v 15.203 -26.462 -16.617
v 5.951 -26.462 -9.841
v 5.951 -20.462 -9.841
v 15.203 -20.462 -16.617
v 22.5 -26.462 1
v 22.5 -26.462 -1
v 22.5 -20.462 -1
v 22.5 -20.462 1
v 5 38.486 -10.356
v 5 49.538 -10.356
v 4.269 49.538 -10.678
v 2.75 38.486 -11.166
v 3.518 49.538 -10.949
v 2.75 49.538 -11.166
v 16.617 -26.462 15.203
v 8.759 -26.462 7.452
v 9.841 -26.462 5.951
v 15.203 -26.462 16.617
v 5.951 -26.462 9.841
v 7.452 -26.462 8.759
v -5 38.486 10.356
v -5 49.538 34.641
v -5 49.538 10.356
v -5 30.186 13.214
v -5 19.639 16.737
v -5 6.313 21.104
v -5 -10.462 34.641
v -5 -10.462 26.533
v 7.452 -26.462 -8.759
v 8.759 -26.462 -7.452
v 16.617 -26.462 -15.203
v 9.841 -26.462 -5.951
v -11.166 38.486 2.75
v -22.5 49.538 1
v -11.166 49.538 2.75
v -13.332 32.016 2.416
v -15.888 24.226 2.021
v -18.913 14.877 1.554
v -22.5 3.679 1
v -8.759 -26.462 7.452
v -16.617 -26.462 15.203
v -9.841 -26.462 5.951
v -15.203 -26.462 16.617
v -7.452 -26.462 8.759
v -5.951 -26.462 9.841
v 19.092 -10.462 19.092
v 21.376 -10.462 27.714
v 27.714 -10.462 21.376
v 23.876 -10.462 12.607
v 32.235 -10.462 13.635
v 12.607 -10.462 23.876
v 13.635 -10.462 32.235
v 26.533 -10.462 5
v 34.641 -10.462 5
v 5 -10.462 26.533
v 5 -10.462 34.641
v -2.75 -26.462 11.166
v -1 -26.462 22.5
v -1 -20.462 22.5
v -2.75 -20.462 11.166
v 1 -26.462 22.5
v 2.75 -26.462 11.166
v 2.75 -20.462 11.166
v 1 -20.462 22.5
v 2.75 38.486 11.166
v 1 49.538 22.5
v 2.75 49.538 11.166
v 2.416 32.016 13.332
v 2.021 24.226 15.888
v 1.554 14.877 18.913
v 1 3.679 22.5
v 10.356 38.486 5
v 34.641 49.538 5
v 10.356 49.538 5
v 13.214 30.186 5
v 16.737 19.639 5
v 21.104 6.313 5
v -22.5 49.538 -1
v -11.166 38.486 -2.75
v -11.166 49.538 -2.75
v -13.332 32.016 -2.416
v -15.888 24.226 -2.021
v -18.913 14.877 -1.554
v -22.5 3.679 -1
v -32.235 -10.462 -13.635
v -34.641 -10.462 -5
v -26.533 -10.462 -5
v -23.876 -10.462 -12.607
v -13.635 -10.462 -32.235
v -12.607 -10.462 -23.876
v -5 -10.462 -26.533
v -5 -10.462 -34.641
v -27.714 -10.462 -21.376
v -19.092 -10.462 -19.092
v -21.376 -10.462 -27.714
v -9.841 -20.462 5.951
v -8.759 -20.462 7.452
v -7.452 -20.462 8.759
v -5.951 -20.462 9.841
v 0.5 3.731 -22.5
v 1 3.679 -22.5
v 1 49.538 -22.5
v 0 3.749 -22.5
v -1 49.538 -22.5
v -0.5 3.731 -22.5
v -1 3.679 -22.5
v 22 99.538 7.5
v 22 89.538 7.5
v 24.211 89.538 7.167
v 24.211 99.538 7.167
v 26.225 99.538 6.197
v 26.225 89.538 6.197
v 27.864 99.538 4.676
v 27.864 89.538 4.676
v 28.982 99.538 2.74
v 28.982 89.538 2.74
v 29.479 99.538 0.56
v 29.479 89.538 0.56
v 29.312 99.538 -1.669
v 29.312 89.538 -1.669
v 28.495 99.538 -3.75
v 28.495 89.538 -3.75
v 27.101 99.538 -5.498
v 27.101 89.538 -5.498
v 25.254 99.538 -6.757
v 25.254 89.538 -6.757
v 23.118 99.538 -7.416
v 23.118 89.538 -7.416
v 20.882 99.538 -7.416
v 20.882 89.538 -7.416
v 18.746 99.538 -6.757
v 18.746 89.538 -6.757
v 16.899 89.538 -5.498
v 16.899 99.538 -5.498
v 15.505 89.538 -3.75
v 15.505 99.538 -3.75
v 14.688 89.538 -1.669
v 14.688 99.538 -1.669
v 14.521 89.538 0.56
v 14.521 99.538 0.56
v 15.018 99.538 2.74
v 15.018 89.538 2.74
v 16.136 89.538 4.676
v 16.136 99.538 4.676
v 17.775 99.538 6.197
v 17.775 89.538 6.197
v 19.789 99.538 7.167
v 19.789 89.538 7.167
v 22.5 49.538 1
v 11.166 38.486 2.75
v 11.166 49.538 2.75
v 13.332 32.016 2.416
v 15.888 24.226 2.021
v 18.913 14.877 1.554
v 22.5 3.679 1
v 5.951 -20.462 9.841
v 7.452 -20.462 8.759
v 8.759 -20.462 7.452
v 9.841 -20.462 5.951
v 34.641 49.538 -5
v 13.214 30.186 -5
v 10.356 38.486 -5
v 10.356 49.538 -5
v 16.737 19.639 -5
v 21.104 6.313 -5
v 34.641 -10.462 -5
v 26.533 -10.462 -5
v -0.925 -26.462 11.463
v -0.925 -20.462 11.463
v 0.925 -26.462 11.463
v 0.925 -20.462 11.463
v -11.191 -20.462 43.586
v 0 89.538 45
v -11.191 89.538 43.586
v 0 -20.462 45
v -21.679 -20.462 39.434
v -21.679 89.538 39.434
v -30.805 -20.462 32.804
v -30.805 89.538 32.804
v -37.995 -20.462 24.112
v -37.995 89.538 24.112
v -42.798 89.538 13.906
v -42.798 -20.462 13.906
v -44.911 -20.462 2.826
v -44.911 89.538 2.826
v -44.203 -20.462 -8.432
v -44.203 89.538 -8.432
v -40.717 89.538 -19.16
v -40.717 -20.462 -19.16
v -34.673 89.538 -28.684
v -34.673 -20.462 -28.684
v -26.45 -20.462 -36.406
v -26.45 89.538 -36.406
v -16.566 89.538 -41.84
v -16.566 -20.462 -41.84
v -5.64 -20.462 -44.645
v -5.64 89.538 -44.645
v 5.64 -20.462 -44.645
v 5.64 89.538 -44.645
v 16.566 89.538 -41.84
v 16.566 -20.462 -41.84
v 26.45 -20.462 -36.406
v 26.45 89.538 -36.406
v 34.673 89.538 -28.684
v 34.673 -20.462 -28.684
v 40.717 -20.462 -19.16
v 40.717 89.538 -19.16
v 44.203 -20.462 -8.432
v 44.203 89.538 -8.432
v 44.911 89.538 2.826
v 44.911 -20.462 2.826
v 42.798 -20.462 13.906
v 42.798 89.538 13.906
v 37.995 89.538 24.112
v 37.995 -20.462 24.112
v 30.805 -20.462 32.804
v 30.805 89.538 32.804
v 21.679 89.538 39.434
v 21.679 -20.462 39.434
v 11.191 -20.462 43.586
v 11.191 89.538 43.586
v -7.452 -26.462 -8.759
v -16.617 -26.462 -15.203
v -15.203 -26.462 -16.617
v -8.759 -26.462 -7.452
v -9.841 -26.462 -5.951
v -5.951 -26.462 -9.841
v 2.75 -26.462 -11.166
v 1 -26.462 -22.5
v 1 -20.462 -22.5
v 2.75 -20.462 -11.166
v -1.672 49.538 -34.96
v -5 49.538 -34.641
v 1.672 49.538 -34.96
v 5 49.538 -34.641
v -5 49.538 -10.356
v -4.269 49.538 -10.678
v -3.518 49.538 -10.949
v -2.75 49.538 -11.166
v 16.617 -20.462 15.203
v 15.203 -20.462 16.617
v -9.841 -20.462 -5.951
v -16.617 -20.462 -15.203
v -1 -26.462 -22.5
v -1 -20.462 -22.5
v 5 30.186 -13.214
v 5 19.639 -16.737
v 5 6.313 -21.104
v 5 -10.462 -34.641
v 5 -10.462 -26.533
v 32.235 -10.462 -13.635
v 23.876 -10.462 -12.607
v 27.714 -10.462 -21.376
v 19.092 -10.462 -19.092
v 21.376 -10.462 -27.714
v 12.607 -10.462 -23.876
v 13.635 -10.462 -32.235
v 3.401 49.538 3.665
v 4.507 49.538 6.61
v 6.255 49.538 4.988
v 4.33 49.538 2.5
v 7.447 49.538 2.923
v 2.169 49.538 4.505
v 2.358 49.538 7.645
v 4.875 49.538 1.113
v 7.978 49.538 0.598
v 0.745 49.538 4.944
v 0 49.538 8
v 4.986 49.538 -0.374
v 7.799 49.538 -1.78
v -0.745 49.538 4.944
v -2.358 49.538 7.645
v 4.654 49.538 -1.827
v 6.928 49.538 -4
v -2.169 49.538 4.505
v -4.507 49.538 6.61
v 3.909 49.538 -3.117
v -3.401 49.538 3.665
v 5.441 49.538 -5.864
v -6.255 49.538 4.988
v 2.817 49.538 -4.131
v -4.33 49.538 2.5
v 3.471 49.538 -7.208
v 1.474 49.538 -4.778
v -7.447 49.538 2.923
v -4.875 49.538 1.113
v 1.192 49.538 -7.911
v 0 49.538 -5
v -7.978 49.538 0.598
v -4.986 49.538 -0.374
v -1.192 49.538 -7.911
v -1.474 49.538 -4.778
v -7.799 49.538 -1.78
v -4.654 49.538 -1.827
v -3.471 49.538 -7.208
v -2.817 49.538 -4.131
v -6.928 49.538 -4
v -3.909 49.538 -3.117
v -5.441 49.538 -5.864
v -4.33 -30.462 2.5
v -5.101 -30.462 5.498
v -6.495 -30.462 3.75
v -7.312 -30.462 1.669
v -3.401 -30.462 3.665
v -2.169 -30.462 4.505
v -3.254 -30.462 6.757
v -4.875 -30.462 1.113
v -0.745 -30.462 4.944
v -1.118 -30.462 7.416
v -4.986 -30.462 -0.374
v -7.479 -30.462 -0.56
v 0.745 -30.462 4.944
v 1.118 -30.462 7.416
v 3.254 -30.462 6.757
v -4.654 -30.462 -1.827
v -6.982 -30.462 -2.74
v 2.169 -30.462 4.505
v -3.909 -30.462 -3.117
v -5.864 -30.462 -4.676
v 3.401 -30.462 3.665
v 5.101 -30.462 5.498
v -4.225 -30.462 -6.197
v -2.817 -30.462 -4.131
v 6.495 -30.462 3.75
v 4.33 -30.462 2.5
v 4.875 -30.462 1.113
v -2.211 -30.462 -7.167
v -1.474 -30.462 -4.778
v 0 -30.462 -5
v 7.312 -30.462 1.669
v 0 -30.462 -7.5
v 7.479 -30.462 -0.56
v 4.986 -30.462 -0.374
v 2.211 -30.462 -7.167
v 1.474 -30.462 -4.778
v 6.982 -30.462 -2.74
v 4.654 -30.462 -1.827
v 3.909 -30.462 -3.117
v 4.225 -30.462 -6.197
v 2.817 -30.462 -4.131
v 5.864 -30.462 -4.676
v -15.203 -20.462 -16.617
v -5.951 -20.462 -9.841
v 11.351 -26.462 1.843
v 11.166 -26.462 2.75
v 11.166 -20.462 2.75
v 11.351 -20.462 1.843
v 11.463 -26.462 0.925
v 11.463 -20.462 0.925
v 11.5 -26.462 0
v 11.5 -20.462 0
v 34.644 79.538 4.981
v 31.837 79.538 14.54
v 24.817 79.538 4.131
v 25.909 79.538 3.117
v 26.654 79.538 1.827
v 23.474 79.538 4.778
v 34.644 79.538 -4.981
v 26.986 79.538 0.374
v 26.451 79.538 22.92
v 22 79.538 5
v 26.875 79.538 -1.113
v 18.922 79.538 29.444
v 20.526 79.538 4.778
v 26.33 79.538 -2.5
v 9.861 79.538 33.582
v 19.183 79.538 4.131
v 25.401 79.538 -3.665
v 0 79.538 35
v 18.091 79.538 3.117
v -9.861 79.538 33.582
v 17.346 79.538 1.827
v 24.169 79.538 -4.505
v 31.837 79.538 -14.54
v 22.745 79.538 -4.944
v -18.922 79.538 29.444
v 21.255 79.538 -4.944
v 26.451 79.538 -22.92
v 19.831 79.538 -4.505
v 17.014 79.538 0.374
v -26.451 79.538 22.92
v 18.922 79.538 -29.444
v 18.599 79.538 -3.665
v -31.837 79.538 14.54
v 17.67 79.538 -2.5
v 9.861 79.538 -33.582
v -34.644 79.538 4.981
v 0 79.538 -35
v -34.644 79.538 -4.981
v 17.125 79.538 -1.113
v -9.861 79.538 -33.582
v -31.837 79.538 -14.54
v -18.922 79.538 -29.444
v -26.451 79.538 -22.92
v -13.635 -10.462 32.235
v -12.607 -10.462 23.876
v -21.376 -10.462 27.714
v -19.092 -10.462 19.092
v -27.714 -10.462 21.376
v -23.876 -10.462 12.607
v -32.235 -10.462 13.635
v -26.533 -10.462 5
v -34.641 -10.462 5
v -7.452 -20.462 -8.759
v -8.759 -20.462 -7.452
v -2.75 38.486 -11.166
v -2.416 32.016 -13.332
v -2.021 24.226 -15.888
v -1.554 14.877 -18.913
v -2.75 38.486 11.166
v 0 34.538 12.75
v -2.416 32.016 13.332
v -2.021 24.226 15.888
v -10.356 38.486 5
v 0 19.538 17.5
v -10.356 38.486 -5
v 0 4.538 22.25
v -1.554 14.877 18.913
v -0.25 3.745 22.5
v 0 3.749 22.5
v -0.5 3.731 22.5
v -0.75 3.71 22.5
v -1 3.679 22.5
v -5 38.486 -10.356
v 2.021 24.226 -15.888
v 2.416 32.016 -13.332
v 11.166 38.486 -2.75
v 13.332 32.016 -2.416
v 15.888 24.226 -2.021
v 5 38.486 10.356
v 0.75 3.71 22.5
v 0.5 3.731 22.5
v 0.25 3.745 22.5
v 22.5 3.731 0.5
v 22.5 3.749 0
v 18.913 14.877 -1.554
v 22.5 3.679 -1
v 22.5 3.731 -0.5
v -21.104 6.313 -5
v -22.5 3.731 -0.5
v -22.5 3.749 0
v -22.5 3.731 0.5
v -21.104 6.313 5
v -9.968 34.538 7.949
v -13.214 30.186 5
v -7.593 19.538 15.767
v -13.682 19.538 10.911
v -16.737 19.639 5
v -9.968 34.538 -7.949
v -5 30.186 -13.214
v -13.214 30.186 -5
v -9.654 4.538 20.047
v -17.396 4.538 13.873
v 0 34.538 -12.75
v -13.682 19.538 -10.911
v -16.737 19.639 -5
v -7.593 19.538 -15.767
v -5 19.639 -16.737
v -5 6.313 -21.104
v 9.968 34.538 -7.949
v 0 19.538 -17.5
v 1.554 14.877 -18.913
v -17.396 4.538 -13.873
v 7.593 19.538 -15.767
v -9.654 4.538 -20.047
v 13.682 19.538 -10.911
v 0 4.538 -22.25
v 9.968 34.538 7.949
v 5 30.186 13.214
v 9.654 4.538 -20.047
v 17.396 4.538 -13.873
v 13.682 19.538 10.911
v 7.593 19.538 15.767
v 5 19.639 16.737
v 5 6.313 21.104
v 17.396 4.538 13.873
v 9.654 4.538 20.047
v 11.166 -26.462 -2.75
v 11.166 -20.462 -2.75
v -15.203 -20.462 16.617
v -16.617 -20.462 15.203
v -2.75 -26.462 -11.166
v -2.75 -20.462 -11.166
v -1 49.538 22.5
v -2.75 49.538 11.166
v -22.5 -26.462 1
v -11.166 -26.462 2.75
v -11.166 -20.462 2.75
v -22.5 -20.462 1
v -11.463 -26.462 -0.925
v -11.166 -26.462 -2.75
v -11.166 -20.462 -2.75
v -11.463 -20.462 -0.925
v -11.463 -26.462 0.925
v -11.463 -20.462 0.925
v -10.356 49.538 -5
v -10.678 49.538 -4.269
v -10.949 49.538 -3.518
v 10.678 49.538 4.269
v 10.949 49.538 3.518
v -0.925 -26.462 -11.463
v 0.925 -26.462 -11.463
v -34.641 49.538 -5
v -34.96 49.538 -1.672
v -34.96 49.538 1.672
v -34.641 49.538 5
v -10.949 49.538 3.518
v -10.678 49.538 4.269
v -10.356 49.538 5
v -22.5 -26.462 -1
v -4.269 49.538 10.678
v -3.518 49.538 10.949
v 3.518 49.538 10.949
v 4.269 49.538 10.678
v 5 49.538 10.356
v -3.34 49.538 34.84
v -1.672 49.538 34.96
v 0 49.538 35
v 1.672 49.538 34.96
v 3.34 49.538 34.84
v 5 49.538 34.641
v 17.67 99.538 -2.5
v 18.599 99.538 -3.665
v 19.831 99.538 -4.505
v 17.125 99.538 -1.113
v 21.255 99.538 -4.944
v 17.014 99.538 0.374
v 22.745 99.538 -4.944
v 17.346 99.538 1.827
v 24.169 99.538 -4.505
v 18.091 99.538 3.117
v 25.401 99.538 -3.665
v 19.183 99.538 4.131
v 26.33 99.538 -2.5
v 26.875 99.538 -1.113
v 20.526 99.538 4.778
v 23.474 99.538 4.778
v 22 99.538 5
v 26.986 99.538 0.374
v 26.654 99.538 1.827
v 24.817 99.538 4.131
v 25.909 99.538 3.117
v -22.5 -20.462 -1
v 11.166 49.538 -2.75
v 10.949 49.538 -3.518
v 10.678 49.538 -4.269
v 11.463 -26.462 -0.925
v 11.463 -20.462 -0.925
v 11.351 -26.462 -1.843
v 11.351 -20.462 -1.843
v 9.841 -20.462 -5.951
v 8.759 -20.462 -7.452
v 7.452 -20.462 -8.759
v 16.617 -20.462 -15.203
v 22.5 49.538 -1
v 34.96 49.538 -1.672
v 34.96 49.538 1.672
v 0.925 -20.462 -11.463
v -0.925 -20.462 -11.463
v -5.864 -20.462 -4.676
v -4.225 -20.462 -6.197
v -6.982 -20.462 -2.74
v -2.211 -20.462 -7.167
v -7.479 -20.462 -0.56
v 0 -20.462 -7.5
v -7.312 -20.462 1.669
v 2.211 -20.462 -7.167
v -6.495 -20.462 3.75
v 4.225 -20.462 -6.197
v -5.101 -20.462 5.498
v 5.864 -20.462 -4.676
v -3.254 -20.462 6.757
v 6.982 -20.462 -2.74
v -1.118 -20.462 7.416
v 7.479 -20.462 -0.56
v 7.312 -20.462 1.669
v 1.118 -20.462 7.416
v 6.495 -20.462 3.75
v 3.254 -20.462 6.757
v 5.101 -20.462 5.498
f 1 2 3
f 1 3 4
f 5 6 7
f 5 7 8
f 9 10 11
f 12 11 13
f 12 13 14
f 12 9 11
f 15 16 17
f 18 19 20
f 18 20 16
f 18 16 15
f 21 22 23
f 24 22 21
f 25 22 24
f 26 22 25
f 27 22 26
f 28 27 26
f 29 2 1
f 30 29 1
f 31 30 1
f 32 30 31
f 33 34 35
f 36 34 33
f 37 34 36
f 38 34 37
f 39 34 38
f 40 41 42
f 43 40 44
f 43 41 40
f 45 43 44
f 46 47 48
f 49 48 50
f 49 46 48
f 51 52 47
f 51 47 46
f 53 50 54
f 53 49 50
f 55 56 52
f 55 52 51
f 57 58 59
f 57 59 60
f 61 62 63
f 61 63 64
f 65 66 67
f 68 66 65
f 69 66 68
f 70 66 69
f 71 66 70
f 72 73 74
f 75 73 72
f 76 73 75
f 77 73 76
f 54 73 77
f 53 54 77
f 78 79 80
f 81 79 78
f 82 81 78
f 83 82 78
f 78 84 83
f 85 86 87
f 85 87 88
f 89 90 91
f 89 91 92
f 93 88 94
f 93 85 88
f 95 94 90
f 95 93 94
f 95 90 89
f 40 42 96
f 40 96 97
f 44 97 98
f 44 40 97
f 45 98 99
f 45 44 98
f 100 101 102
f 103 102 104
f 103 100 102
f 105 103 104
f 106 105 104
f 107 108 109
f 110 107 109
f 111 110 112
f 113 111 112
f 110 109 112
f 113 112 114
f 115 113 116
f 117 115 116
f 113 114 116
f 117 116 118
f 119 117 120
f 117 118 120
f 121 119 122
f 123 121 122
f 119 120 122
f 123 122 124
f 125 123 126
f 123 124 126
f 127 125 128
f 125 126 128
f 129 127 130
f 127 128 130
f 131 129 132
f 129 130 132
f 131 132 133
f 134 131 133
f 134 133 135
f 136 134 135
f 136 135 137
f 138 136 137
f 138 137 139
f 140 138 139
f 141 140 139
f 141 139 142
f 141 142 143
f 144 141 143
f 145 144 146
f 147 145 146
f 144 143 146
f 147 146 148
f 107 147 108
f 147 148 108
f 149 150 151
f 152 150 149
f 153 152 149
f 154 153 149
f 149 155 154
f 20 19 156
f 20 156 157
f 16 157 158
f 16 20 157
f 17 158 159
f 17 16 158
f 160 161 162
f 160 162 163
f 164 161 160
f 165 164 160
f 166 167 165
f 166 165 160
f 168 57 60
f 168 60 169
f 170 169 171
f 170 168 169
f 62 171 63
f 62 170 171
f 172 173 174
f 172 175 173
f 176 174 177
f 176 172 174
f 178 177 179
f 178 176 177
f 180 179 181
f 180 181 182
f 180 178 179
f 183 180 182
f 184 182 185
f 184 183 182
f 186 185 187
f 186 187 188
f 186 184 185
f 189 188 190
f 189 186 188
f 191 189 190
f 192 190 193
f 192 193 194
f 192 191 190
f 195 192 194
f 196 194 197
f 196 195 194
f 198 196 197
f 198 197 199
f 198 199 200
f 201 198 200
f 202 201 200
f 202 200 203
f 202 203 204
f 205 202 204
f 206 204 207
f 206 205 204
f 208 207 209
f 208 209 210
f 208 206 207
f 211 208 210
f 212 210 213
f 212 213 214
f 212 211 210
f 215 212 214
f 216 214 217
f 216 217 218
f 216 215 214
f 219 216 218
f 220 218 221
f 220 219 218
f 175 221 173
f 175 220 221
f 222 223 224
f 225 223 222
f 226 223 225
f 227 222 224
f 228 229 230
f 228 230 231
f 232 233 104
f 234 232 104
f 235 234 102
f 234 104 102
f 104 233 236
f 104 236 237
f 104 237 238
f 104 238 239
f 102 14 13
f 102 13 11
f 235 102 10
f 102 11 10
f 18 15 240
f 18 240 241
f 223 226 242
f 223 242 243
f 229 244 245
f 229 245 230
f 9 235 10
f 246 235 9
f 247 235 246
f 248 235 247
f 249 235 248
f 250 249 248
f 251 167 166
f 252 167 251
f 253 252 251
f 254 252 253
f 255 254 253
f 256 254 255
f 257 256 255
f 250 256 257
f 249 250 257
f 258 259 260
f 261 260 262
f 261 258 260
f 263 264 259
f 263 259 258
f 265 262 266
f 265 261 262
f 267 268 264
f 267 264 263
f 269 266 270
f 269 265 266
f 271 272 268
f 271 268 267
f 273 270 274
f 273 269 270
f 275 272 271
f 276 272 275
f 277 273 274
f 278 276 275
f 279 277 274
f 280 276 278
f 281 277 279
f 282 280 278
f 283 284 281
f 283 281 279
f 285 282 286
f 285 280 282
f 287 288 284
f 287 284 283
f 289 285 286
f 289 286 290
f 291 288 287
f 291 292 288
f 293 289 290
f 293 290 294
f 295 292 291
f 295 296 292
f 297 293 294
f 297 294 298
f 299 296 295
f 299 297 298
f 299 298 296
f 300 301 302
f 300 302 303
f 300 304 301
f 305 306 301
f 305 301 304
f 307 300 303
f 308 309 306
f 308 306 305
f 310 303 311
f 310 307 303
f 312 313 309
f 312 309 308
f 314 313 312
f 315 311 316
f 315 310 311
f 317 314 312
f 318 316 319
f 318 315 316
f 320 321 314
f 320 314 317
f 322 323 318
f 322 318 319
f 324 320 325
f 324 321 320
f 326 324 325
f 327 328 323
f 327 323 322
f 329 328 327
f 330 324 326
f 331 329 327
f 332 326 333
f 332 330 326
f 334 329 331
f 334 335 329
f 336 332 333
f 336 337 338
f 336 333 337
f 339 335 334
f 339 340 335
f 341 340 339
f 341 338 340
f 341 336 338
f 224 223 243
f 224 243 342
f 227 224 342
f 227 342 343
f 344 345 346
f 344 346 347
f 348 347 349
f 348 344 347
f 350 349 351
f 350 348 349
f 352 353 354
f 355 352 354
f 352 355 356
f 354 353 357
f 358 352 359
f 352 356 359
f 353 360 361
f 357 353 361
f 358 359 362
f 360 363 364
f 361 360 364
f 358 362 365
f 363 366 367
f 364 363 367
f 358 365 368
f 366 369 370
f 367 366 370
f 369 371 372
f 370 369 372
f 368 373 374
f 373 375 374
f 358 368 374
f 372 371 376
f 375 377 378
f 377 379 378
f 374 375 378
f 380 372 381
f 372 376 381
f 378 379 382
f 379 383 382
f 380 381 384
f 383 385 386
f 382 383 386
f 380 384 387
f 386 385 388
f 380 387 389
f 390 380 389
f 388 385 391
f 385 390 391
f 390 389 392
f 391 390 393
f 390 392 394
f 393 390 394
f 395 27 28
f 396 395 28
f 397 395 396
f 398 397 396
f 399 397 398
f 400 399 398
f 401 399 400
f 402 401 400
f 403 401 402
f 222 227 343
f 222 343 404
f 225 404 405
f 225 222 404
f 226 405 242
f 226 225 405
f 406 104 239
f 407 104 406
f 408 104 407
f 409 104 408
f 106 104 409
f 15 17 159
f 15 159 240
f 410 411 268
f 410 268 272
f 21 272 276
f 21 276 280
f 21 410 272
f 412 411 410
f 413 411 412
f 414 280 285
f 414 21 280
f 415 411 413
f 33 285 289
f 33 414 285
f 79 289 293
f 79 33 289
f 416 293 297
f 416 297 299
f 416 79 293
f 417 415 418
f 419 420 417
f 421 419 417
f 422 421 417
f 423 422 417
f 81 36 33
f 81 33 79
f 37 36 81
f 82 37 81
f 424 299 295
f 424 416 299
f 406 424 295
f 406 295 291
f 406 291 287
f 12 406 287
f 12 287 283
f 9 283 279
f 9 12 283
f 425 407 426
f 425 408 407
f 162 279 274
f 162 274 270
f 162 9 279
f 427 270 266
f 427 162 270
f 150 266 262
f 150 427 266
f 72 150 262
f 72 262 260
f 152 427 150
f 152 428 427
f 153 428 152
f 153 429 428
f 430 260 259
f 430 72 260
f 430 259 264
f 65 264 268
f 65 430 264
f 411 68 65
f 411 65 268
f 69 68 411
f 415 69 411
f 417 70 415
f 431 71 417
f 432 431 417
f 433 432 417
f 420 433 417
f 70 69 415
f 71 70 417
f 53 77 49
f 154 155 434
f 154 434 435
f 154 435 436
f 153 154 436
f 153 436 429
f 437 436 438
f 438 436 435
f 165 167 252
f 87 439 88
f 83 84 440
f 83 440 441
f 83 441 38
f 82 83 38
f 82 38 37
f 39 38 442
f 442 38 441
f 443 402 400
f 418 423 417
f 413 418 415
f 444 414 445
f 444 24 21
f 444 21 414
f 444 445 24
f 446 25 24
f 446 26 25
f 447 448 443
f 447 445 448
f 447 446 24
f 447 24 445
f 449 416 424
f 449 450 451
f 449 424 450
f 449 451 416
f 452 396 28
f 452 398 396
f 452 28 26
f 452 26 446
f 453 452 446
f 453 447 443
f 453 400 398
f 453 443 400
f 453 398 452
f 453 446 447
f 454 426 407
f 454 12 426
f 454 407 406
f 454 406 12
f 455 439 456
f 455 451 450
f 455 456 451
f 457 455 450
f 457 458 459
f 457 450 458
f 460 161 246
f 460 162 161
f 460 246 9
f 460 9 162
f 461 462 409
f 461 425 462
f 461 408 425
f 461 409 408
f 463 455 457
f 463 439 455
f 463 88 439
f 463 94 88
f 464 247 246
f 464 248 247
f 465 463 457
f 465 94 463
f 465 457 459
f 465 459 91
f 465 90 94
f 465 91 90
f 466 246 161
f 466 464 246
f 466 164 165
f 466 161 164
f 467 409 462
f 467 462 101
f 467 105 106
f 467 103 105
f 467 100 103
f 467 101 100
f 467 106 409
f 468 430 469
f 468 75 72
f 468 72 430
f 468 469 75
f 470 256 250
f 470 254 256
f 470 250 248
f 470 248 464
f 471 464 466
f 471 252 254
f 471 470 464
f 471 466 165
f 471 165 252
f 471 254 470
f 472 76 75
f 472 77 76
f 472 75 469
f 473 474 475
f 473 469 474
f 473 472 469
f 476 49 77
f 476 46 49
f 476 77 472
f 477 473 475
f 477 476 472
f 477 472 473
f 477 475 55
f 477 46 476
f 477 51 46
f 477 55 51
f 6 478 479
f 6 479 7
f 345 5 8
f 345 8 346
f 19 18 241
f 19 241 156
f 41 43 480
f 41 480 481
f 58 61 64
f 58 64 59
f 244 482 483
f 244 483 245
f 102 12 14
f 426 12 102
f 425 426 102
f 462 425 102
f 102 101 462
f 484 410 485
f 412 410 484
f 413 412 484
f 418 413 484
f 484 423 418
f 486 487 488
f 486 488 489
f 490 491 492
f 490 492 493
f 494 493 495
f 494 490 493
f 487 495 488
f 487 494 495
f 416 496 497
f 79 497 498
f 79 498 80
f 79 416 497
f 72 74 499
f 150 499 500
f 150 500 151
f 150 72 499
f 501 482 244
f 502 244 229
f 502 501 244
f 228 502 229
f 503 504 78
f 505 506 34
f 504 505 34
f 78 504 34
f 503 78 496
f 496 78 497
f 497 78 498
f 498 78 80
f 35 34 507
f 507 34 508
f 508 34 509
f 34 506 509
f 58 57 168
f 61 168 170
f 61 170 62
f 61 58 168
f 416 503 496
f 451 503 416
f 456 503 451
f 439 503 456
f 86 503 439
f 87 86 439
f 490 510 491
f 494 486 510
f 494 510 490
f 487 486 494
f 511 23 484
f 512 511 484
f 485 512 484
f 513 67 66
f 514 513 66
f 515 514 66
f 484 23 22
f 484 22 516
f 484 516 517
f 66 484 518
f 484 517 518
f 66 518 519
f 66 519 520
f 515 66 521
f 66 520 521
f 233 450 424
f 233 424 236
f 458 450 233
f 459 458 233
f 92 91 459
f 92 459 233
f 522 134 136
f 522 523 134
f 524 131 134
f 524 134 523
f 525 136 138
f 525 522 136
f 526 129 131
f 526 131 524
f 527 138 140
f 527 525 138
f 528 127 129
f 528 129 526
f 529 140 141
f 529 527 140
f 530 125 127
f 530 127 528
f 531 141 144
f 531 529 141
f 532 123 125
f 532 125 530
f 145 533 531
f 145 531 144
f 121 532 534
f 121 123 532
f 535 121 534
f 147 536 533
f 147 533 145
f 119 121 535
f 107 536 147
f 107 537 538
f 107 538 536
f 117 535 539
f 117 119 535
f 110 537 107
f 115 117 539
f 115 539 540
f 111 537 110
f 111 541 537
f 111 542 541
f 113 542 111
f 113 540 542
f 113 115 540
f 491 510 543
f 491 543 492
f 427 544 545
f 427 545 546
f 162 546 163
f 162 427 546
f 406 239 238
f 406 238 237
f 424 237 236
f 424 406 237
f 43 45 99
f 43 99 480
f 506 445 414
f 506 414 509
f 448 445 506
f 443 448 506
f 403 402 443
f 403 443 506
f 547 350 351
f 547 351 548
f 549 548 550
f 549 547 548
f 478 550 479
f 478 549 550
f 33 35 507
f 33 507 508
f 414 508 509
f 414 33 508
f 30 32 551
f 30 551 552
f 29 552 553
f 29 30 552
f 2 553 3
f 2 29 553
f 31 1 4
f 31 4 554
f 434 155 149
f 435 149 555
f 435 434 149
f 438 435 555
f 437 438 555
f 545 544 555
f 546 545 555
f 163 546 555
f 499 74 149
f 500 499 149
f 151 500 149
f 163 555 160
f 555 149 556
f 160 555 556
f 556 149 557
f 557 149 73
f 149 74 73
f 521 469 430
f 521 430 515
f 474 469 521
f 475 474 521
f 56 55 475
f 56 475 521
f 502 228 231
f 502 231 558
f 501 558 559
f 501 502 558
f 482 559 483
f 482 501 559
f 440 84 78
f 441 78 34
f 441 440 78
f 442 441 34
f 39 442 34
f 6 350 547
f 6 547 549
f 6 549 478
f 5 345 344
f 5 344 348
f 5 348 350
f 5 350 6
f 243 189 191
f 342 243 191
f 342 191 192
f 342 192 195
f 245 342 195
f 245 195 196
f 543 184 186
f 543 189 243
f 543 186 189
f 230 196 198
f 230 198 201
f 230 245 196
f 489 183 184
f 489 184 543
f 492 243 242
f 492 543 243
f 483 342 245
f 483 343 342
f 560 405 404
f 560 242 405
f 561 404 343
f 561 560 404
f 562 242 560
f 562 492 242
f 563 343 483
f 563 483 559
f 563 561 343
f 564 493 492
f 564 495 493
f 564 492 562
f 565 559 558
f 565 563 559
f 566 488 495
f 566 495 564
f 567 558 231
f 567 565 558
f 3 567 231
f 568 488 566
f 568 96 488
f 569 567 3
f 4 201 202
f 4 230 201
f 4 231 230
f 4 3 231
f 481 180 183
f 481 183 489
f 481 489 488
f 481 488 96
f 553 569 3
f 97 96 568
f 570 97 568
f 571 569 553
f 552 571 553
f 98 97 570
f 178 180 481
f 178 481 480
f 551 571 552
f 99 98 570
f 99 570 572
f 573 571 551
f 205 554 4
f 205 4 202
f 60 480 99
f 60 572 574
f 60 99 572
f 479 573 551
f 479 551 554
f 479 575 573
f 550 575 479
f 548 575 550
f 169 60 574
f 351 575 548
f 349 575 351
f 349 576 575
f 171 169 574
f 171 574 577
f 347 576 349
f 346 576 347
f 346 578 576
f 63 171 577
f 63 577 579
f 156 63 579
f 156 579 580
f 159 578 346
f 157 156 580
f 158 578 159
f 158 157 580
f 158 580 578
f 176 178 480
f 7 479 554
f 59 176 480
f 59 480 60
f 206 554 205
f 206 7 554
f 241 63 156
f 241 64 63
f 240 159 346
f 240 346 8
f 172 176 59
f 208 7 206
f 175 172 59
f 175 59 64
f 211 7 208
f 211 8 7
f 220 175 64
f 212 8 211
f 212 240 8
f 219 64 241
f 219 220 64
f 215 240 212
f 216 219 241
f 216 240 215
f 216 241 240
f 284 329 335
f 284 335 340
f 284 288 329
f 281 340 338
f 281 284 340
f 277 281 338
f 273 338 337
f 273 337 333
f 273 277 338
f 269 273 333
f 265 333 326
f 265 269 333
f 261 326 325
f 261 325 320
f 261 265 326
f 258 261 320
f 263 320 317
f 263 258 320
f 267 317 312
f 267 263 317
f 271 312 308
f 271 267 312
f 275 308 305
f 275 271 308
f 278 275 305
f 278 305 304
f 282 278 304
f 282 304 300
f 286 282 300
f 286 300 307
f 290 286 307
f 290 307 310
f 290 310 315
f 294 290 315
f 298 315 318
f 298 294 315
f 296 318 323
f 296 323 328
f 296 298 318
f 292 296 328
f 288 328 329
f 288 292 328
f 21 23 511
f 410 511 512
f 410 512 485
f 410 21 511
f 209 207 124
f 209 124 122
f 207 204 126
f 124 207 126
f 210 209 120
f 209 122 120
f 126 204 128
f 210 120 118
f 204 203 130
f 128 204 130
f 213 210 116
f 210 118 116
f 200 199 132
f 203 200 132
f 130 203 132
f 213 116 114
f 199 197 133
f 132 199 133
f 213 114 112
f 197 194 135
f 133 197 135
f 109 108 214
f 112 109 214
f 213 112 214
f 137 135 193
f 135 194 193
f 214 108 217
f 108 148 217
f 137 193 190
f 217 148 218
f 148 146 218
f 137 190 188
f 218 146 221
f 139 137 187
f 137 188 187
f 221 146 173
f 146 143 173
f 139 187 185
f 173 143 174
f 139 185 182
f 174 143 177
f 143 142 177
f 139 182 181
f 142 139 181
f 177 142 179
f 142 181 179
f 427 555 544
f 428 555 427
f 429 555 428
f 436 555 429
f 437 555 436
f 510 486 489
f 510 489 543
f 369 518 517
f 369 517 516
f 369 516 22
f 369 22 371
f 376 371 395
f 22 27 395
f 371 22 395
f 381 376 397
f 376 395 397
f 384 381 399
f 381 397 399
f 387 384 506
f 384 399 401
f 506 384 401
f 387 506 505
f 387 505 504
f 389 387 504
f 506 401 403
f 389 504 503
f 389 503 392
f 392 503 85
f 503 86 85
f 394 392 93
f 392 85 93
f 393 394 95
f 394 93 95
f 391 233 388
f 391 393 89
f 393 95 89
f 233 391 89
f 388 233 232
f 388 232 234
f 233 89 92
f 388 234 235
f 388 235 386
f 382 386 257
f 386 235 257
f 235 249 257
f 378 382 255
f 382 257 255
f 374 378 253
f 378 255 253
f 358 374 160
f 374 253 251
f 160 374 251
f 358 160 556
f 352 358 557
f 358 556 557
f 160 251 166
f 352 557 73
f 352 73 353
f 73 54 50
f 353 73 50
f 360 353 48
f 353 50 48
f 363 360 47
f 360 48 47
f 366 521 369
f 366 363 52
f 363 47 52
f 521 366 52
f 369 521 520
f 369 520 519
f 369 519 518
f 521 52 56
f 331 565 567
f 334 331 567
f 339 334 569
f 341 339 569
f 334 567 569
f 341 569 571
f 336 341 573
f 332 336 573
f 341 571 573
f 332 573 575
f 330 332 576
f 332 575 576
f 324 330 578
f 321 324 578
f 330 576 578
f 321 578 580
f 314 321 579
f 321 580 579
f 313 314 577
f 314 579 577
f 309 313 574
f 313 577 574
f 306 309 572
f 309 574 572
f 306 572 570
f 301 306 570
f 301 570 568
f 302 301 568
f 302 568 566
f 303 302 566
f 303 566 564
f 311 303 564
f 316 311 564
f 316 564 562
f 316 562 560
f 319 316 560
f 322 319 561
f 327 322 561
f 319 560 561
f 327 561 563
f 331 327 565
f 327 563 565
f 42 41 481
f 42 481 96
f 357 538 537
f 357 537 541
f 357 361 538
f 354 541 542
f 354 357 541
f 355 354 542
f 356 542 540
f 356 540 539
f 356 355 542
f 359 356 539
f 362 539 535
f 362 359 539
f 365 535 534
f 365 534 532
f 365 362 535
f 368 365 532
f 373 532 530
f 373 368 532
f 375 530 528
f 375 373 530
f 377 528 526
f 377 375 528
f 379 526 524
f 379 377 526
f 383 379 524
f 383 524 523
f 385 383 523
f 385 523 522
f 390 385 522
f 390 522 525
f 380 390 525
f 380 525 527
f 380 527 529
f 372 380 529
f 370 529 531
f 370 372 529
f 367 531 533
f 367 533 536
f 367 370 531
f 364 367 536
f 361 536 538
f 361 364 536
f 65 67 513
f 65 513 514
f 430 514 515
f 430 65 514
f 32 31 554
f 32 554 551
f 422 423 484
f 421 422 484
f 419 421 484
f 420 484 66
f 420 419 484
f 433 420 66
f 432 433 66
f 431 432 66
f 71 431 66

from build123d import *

# Parameters (mm, degrees)
SKETCH1_W           = 35
SKETCH1_H           = 10
BOSS_EXTRUDE1_DEPTH = 70
SKETCH2_3_R         = 7.5
SKETCH2_3_R_2       = 5
BOSS_EXTRUDE2_DEPTH = 10
CUT_EXTRUDE1_START  = -70
SKETCH2_4_R         = 5
CUT_EXTRUDE1_DEPTH  = 70
SKETCH3_R           = 7.5
SKETCH3_R_2         = 5
BOSS_EXTRUDE3_DEPTH = 10
CUT_EXTRUDE3_START  = -10
SKETCH3_2_R         = 5
CUT_EXTRUDE3_DEPTH  = 10
BOSS_EXTRUDE6_START = 6
BOSS_EXTRUDE6_DEPTH = 6


with BuildPart() as part:
    # Sketch1 → Revolve1 (revolve)
    with BuildSketch(Plane(origin=(0, 0, 0), x_dir=(0, 0, -1), z_dir=(1, 0, 0)), mode=Mode.PRIVATE) as revolve1_sk:
        Polygon((35, 79.538461538), (35, 89.538461538), (45, 89.538461538), (45, -20.461538462), (0, -20.461538462), (0, -10.461538462), (0, 49.538461538), (8, 49.538461538), (27, -10.461538462), (35, -10.461538462), align=None)
        with Locations((17.5, 84.538461538)):
            Rectangle(SKETCH1_W, SKETCH1_H)
    revolve(revolve1_sk.sketch.rotate(Axis((0, 0, 0), (0, -1, 0)), 180), axis=Axis((0, 0, 0), (0, -1, 0)))

    # Sketch2 → Boss-Extrude1 (add)
    with BuildSketch(Plane.XZ.offset(20.461538462)):
        with BuildLine():
            Line((40, 5), (10.356157589, 5))
            ThreePointArc((10.356157589, 5), (10.819851722, 3.896255731), (11.166285361, 2.750285665))
            Line((11.166285361, 2.750285665), (22.5, 1))
            Line((22.5, 1), (22.5, -1))
            Line((22.5, -1), (11.166285361, -2.750285665))
            ThreePointArc((11.166285361, -2.750285665), (10.819851722, -3.896255731), (10.356157589, -5))
            Line((10.356157589, -5), (40, -5))
            Line((40, -5), (40, 5))
        make_face()
        with BuildLine():
            ThreePointArc((2.750285665, 11.166285361), (3.896255731, 10.819851722), (5, 10.356157589))
            Line((5, 10.356157589), (5, 40))
            Line((5, 40), (-5, 40))
            Line((-5, 40), (-5, 10.356157589))
            ThreePointArc((-5, 10.356157589), (-3.896255731, 10.819851722), (-2.750285665, 11.166285361))
            Line((-2.750285665, 11.166285361), (-1, 22.5))
            Line((-1, 22.5), (1, 22.5))
            Line((1, 22.5), (2.750285665, 11.166285361))
        make_face()
        with BuildLine():
            Line((5, -40), (5, -10.356157589))
            ThreePointArc((5, -10.356157589), (3.896255731, -10.819851722), (2.750285665, -11.166285361))
            Line((2.750285665, -11.166285361), (1, -22.5))
            Line((1, -22.5), (-1, -22.5))
            Line((-1, -22.5), (-2.750285665, -11.166285361))
            ThreePointArc((-2.750285665, -11.166285361), (-3.896255731, -10.819851722), (-5, -10.356157589))
            Line((-5, -10.356157589), (-5, -40))
            Line((-5, -40), (5, -40))
        make_face()
        with BuildLine():
            ThreePointArc((-11.166285361, 2.750285665), (-10.819851722, 3.896255731), (-10.356157589, 5))
            Line((-10.356157589, 5), (-40, 5))
            Line((-40, 5), (-40, -5))
            Line((-40, -5), (-10.356157589, -5))
            ThreePointArc((-10.356157589, -5), (-10.819851722, -3.896255731), (-11.166285361, -2.750285665))
            Line((-11.166285361, -2.750285665), (-22.5, -1))
            Line((-22.5, -1), (-22.5, 1))
            Line((-22.5, 1), (-11.166285361, 2.750285665))
        make_face()
    extrude(amount=-BOSS_EXTRUDE1_DEPTH)

    # Sketch2<3> → Boss-Extrude2 (add)
    with BuildSketch(Plane.XZ.offset(20.461538462)):
        with Locations(Location((0, 0, 0), (0, 0, 270))):
            Circle(SKETCH2_3_R)
        with Locations(Location((0, 0, 0), (0, 0, 270))):
            Circle(SKETCH2_3_R_2, mode=Mode.SUBTRACT)
    extrude(amount=BOSS_EXTRUDE2_DEPTH)

    # Sketch2<4> → Cut-Extrude1 (cut)
    with BuildSketch(Plane.XZ.offset(20.461538462).offset(CUT_EXTRUDE1_START)):
        with Locations(Location((0, 0, 0), (0, 0, 270))):
            Circle(SKETCH2_4_R)
    extrude(amount=CUT_EXTRUDE1_DEPTH, mode=Mode.SUBTRACT)

    # Sketch3 → Boss-Extrude3 (add)
    with BuildSketch(Plane(origin=(0, 89.538461538, 0), x_dir=(1, 0, 0), z_dir=(0, 1, 0))):
        with Locations(Location((22, 0, 0), (0, 0, 270))):
            Circle(SKETCH3_R)
        with Locations(Location((22, 0, 0), (0, 0, 270))):
            Circle(SKETCH3_R_2, mode=Mode.SUBTRACT)
    extrude(amount=BOSS_EXTRUDE3_DEPTH)

    # Sketch3<2> → Cut-Extrude3 (cut)
    with BuildSketch(Plane(origin=(0, 89.538461538, 0), x_dir=(1, 0, 0), z_dir=(0, 1, 0)).offset(CUT_EXTRUDE3_START)):
        with Locations(Location((22, 0, 0), (0, 0, 270))):
            Circle(SKETCH3_2_R)
    extrude(amount=CUT_EXTRUDE3_DEPTH, mode=Mode.SUBTRACT)

    # Sketch2<5> → Boss-Extrude6 (add)
    with BuildSketch(Plane.XZ.offset(20.461538462).offset(BOSS_EXTRUDE6_START)):
        with BuildLine():
            ThreePointArc((-9.840501743, 5.951010455), (-8.131727984, 8.131727984), (-5.951010455, 9.840501743))
            Line((-5.951010455, 9.840501743), (-15.202795796, 16.617009358))
            Line((-15.202795796, 16.617009358), (-15.909902577, 15.909902577))
            Line((-15.909902577, 15.909902577), (-16.617009358, 15.202795796))
            Line((-16.617009358, 15.202795796), (-9.840501743, 5.951010455))
        make_face()
        with BuildLine():
            ThreePointArc((-2.750285665, 11.166285361), (0, 11.5), (2.750285665, 11.166285361))
            Line((2.750285665, 11.166285361), (1, 22.5))
            Line((1, 22.5), (0, 22.5))
            Line((0, 22.5), (-1, 22.5))
            Line((-1, 22.5), (-2.750285665, 11.166285361))
        make_face()
        with BuildLine():
            ThreePointArc((5.951010455, 9.840501743), (8.131727984, 8.131727984), (9.840501743, 5.951010455))
            Line((9.840501743, 5.951010455), (16.617009358, 15.202795796))
            Line((16.617009358, 15.202795796), (15.909902577, 15.909902577))
            Line((15.909902577, 15.909902577), (15.202795796, 16.617009358))
            Line((15.202795796, 16.617009358), (5.951010455, 9.840501743))
        make_face()
        with BuildLine():
            Line((22.5, 1), (11.166285361, 2.750285665))
            ThreePointArc((11.166285361, 2.750285665), (11.416266501, 1.385228925), (11.5, 0))
            ThreePointArc((11.5, 0), (11.416266501, -1.385228925), (11.166285361, -2.750285665))
            Line((11.166285361, -2.750285665), (22.5, -1))
            Line((22.5, -1), (22.5, 0))
            Line((22.5, 0), (22.5, 1))
        make_face()
        with BuildLine():
            Line((16.617009358, -15.202795796), (9.840501743, -5.951010455))
            ThreePointArc((9.840501743, -5.951010455), (8.131727984, -8.131727984), (5.951010455, -9.840501743))
            Line((5.951010455, -9.840501743), (15.202795796, -16.617009358))
            Line((15.202795796, -16.617009358), (15.909902577, -15.909902577))
            Line((15.909902577, -15.909902577), (16.617009358, -15.202795796))
        make_face()
        with BuildLine():
            Line((1, -22.5), (2.750285665, -11.166285361))
            ThreePointArc((2.750285665, -11.166285361), (0, -11.5), (-2.750285665, -11.166285361))
            Line((-2.750285665, -11.166285361), (-1, -22.5))
            Line((-1, -22.5), (0, -22.5))
            Line((0, -22.5), (1, -22.5))
        make_face()
        with BuildLine():
            Line((-15.202795796, -16.617009358), (-5.951010455, -9.840501743))
            ThreePointArc((-5.951010455, -9.840501743), (-8.131727984, -8.131727984), (-9.840501743, -5.951010455))
            Line((-9.840501743, -5.951010455), (-16.617009358, -15.202795796))
            Line((-16.617009358, -15.202795796), (-15.909902577, -15.909902577))
            Line((-15.909902577, -15.909902577), (-15.202795796, -16.617009358))
        make_face()
        with BuildLine():
            ThreePointArc((-11.166285361, -2.750285665), (-11.5, 0), (-11.166285361, 2.750285665))
            Line((-11.166285361, 2.750285665), (-22.5, 1))
            Line((-22.5, 1), (-22.5, 0))
            Line((-22.5, 0), (-22.5, -1))
            Line((-22.5, -1), (-11.166285361, -2.750285665))
        make_face()
    extrude(amount=-BOSS_EXTRUDE6_DEPTH)


solid = part.part
